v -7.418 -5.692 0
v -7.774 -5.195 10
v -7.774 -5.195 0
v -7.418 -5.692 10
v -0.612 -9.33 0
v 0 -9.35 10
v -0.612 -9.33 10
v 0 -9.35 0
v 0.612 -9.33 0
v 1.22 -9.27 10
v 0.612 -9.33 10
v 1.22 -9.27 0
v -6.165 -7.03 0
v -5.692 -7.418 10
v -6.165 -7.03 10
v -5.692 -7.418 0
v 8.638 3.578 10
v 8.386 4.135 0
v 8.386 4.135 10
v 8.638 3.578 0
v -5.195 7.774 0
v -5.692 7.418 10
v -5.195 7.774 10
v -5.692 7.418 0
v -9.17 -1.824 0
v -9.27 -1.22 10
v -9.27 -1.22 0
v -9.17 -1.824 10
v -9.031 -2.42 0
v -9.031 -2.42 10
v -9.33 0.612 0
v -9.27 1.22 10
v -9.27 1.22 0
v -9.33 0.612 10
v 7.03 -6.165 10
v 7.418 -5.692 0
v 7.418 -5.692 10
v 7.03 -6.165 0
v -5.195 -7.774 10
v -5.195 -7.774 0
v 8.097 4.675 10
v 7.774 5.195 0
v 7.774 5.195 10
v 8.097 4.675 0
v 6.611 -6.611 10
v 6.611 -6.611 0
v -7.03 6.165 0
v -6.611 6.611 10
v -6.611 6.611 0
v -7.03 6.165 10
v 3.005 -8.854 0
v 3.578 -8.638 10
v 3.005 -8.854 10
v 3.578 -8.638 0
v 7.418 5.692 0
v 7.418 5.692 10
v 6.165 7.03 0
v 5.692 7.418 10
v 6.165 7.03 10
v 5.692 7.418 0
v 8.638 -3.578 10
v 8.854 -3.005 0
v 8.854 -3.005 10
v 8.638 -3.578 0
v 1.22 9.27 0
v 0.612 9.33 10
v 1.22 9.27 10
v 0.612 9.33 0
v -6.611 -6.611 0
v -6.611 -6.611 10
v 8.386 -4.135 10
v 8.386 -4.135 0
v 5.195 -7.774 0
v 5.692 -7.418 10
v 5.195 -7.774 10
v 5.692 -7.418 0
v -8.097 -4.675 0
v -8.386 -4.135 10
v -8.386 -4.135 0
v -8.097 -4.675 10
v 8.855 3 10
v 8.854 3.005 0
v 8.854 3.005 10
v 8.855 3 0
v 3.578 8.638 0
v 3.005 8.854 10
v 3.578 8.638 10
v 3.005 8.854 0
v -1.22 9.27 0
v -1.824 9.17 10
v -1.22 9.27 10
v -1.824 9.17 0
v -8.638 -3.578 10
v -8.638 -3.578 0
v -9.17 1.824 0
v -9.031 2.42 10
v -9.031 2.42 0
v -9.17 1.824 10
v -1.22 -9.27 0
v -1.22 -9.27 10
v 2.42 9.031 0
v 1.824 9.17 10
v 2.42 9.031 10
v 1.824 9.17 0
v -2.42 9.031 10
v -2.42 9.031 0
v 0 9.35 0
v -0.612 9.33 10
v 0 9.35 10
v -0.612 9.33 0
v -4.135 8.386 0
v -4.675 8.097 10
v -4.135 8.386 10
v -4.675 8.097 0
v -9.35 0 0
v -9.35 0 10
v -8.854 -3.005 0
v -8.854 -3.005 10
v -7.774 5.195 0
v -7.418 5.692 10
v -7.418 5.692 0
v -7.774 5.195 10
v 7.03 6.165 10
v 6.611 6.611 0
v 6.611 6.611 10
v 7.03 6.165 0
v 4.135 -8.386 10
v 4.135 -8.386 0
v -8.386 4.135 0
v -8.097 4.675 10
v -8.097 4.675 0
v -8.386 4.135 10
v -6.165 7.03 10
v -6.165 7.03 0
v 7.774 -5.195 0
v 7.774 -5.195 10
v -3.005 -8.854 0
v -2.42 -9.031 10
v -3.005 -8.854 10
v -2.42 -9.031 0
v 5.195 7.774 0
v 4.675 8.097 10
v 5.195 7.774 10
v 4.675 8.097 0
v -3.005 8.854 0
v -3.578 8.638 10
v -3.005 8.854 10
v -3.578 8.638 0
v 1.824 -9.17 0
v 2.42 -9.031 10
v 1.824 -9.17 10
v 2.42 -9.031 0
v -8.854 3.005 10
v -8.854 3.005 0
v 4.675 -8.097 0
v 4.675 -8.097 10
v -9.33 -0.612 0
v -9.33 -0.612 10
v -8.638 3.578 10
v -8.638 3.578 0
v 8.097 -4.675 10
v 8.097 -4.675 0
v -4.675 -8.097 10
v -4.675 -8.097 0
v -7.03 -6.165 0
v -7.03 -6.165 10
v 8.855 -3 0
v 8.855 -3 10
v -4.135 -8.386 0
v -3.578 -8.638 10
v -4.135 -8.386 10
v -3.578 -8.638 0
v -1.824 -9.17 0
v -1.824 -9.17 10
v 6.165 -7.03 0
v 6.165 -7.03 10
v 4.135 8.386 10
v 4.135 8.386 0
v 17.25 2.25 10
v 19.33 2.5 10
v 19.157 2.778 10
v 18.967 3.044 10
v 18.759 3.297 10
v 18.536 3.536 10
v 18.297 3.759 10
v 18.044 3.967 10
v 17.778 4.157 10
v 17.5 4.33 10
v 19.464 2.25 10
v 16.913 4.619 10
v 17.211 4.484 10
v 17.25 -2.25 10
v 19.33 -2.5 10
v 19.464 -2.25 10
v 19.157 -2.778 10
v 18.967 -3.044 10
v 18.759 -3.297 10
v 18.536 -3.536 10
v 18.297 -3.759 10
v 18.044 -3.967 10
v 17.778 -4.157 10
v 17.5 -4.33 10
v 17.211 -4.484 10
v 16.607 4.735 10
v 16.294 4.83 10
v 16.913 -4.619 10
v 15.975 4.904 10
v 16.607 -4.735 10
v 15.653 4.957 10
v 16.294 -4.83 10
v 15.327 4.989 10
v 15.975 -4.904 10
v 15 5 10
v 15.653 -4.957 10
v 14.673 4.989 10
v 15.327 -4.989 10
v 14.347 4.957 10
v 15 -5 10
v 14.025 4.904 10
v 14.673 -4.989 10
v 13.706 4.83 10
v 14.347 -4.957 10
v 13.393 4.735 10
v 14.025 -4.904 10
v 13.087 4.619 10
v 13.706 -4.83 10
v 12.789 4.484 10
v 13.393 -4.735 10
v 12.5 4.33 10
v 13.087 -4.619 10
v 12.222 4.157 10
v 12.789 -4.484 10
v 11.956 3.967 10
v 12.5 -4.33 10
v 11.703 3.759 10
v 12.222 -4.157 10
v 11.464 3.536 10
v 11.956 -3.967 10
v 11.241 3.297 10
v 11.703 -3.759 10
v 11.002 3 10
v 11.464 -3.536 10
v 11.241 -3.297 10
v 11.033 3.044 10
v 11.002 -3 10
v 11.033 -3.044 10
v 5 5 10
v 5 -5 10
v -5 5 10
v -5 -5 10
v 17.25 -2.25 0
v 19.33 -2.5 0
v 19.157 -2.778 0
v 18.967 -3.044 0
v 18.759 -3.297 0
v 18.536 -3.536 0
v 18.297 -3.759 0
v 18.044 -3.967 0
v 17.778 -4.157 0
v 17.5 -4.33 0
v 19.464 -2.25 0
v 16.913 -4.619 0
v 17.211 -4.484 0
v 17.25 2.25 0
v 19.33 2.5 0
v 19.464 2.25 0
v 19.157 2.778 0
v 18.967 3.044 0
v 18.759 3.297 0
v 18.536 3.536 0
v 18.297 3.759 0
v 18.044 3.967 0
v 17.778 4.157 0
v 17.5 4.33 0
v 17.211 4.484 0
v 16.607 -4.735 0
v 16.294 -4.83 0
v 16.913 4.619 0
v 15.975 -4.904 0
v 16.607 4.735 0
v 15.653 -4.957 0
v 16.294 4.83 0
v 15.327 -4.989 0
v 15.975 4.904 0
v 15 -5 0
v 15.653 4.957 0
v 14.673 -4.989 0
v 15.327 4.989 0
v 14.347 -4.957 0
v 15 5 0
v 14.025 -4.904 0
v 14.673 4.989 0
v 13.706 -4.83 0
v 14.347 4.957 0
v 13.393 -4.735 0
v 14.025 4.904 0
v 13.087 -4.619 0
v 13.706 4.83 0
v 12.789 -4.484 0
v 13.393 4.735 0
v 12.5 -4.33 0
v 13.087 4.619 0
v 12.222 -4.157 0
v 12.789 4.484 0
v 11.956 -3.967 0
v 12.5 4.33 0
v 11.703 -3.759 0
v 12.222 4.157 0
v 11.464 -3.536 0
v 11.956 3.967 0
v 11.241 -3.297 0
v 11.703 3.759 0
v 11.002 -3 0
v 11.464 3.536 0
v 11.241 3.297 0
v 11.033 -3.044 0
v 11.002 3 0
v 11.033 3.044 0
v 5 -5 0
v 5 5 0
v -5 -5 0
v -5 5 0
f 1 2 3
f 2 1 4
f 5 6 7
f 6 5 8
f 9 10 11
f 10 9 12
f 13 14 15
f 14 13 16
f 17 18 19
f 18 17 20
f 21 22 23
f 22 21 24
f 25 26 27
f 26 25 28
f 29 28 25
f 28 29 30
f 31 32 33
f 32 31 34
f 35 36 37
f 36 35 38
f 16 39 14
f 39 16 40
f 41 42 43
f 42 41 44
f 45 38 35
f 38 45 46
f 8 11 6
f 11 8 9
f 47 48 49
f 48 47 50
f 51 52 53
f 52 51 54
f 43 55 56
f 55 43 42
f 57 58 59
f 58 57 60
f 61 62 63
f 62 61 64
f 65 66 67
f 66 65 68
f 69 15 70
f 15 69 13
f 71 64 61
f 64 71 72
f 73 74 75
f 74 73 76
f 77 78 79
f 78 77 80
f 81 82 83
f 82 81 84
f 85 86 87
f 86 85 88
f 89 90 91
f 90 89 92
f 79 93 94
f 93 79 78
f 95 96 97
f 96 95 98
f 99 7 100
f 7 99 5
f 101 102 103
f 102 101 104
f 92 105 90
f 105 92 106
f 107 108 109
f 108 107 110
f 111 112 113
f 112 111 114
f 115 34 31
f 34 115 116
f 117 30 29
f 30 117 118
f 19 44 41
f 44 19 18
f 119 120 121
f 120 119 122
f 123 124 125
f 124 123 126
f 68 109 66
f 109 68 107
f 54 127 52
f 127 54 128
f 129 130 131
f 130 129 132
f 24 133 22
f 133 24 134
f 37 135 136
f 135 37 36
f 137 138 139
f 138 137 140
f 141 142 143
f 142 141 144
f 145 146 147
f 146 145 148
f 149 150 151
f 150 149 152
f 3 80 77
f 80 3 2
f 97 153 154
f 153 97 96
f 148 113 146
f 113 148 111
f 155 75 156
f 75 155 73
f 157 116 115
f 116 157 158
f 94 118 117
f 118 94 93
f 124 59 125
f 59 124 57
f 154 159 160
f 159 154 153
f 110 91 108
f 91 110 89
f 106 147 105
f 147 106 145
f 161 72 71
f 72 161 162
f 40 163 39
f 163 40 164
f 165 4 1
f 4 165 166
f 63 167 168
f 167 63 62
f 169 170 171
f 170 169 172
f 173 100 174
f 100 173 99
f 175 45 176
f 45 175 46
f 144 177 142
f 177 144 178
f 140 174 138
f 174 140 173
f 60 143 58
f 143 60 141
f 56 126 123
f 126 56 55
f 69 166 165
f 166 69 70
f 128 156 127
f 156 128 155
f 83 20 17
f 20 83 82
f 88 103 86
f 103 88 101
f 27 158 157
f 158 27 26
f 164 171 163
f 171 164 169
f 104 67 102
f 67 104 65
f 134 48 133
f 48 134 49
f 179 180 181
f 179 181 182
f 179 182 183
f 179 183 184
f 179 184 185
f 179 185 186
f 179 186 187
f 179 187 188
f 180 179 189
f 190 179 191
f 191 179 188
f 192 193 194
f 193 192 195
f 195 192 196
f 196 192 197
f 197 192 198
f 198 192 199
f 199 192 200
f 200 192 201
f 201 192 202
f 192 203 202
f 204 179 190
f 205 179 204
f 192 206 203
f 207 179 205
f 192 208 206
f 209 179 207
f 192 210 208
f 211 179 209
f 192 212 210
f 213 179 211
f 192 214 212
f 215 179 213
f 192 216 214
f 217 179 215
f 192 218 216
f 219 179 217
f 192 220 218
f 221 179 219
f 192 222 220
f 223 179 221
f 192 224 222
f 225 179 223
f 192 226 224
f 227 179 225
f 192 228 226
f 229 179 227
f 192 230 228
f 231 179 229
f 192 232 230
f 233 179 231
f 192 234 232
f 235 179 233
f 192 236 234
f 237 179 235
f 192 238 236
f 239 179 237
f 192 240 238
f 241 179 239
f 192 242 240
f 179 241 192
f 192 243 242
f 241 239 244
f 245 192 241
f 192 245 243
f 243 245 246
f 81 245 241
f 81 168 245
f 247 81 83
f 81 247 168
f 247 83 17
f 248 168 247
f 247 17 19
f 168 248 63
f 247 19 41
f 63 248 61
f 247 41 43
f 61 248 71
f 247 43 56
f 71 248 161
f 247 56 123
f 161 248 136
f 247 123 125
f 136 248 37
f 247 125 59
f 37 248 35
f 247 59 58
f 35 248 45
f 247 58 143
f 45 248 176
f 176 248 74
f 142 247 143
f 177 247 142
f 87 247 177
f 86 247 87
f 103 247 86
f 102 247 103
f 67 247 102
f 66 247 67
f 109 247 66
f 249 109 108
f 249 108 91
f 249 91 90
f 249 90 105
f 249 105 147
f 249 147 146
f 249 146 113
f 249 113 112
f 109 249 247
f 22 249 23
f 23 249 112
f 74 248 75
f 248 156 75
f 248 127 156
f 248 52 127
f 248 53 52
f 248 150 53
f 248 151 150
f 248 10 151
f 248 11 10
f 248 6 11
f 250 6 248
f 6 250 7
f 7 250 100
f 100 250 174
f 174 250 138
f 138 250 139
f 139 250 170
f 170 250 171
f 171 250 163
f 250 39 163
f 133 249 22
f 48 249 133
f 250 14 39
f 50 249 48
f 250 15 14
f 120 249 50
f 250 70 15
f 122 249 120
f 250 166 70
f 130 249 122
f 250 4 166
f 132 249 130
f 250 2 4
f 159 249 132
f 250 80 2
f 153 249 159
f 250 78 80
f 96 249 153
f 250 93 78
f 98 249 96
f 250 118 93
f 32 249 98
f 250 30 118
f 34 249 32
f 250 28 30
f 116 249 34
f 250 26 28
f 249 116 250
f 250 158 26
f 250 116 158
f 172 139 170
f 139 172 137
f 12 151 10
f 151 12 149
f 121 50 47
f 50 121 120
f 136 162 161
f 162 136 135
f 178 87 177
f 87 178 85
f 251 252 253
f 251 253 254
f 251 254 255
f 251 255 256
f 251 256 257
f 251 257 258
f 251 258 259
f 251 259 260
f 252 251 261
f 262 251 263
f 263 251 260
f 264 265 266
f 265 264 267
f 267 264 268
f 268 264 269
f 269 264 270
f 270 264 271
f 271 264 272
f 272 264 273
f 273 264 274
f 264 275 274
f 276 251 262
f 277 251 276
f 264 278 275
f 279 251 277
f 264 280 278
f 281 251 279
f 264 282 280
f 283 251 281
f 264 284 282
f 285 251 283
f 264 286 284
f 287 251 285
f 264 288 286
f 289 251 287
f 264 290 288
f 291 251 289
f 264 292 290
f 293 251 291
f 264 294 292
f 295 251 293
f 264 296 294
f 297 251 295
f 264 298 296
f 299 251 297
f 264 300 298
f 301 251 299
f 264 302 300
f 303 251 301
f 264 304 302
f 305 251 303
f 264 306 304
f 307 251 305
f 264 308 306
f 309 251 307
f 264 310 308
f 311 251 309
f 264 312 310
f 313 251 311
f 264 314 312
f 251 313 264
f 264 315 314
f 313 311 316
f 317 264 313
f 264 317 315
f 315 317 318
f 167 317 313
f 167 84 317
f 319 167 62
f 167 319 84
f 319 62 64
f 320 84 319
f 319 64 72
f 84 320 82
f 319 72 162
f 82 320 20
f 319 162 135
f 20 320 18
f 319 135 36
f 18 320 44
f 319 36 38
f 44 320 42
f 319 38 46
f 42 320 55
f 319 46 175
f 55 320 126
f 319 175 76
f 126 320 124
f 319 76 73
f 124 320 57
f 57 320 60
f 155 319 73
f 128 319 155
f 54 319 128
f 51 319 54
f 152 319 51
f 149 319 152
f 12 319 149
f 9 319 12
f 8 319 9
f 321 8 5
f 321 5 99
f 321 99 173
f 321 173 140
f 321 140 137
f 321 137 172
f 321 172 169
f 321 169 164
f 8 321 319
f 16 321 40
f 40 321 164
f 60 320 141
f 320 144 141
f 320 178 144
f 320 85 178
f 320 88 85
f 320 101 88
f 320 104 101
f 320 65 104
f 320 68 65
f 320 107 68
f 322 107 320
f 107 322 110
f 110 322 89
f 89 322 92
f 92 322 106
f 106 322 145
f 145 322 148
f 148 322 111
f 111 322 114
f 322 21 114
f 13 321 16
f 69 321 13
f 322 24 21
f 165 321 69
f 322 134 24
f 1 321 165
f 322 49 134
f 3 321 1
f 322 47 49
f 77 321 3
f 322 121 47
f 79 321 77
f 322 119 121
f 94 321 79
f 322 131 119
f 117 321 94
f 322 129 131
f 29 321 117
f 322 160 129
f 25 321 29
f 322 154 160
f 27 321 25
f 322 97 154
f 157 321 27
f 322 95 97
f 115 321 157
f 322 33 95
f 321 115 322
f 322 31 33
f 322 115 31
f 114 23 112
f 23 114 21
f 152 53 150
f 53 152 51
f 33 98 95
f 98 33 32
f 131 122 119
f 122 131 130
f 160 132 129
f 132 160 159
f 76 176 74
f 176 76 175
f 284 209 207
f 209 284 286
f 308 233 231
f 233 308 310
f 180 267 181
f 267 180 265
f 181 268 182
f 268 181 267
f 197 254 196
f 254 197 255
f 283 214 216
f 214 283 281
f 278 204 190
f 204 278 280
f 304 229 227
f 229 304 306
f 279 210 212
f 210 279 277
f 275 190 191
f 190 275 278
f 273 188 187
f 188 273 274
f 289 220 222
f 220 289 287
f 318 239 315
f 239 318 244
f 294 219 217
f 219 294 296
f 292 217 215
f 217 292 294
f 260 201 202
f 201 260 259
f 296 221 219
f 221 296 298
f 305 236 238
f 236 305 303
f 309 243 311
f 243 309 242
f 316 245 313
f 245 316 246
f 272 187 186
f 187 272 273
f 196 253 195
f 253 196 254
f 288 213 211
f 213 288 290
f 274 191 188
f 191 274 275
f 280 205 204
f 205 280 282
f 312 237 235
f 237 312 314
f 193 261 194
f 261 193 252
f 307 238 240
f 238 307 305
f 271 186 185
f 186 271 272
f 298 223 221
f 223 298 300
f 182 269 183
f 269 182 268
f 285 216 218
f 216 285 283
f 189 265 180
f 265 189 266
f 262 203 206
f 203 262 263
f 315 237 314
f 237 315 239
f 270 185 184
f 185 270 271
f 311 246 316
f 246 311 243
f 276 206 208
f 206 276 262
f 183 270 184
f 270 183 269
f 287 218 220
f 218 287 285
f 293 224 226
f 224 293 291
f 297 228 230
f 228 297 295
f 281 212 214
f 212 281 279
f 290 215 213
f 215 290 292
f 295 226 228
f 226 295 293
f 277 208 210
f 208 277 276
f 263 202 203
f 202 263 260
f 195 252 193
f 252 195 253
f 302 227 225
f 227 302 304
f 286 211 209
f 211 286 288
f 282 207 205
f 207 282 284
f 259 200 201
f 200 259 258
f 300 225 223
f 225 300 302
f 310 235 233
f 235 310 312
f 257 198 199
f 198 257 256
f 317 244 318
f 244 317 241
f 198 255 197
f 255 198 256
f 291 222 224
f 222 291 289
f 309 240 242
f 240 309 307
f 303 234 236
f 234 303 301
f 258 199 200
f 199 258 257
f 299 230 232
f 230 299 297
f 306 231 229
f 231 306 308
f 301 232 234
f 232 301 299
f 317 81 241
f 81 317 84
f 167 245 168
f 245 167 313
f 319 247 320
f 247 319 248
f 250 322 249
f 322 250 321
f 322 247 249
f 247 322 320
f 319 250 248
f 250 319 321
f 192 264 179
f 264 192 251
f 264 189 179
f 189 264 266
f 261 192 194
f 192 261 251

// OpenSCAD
// Snap-on tubing clip for 12.7 mm lab stand rod
// Print orientation: flat on bed, extrusion along +Z

// ---------- Dimensions (mm) ----------
stand_id     = 12.7;   // stand rod inner diameter
stand_wall   = 3;      // stand ring wall thickness
stand_od     = stand_id + 2 * stand_wall;  // 18.7 outer diameter
stand_open   = 10;     // width of -X side opening

tube_id      = 6;      // tubing inner diameter
tube_wall    = 2;      // tubing wall thickness
tube_od      = tube_id + 2 * tube_wall;    // 10 outer diameter
tube_x       = 15;     // tubing ring centre X
tube_open    = 4.5;    // width of +X side opening

bridge_w     = 6;      // bridge width (Y)
bridge_x0    = 8;      // bridge start X
bridge_x1    = 12;     // bridge end X

eps          = 0.5;    // cutter overshoot past faces

$fn = 96;              // curve resolution

// ---------- Model ----------
difference() {
    union() {
        // 1) Stand rod ring
        cylinder(d = stand_od, h = 10);

        // 2) Tubing ring
        translate([tube_x, 0, 0])
            cylinder(d = tube_od, h = 10);

        // 3) Solid bridge between rings
        translate([bridge_x0, -bridge_w / 2, 0])
            cube([bridge_x1 - bridge_x0, bridge_w, 10]);
    }

    // 4) Openings
    // Stand ring -X opening (everything with x < 0 and -5 < y < 5)
    translate([-stand_open / 2, -stand_open / 2, -eps])
        cube([stand_open, stand_open, 10 + 2 * eps]);

    // Tubing ring +X opening (x > 15 and -2.25 < y < 2.25)
    translate([tube_x + tube_open / 2, -tube_open / 2, -eps])
        cube([tube_open, tube_open, 10 + 2 * eps]);
}
